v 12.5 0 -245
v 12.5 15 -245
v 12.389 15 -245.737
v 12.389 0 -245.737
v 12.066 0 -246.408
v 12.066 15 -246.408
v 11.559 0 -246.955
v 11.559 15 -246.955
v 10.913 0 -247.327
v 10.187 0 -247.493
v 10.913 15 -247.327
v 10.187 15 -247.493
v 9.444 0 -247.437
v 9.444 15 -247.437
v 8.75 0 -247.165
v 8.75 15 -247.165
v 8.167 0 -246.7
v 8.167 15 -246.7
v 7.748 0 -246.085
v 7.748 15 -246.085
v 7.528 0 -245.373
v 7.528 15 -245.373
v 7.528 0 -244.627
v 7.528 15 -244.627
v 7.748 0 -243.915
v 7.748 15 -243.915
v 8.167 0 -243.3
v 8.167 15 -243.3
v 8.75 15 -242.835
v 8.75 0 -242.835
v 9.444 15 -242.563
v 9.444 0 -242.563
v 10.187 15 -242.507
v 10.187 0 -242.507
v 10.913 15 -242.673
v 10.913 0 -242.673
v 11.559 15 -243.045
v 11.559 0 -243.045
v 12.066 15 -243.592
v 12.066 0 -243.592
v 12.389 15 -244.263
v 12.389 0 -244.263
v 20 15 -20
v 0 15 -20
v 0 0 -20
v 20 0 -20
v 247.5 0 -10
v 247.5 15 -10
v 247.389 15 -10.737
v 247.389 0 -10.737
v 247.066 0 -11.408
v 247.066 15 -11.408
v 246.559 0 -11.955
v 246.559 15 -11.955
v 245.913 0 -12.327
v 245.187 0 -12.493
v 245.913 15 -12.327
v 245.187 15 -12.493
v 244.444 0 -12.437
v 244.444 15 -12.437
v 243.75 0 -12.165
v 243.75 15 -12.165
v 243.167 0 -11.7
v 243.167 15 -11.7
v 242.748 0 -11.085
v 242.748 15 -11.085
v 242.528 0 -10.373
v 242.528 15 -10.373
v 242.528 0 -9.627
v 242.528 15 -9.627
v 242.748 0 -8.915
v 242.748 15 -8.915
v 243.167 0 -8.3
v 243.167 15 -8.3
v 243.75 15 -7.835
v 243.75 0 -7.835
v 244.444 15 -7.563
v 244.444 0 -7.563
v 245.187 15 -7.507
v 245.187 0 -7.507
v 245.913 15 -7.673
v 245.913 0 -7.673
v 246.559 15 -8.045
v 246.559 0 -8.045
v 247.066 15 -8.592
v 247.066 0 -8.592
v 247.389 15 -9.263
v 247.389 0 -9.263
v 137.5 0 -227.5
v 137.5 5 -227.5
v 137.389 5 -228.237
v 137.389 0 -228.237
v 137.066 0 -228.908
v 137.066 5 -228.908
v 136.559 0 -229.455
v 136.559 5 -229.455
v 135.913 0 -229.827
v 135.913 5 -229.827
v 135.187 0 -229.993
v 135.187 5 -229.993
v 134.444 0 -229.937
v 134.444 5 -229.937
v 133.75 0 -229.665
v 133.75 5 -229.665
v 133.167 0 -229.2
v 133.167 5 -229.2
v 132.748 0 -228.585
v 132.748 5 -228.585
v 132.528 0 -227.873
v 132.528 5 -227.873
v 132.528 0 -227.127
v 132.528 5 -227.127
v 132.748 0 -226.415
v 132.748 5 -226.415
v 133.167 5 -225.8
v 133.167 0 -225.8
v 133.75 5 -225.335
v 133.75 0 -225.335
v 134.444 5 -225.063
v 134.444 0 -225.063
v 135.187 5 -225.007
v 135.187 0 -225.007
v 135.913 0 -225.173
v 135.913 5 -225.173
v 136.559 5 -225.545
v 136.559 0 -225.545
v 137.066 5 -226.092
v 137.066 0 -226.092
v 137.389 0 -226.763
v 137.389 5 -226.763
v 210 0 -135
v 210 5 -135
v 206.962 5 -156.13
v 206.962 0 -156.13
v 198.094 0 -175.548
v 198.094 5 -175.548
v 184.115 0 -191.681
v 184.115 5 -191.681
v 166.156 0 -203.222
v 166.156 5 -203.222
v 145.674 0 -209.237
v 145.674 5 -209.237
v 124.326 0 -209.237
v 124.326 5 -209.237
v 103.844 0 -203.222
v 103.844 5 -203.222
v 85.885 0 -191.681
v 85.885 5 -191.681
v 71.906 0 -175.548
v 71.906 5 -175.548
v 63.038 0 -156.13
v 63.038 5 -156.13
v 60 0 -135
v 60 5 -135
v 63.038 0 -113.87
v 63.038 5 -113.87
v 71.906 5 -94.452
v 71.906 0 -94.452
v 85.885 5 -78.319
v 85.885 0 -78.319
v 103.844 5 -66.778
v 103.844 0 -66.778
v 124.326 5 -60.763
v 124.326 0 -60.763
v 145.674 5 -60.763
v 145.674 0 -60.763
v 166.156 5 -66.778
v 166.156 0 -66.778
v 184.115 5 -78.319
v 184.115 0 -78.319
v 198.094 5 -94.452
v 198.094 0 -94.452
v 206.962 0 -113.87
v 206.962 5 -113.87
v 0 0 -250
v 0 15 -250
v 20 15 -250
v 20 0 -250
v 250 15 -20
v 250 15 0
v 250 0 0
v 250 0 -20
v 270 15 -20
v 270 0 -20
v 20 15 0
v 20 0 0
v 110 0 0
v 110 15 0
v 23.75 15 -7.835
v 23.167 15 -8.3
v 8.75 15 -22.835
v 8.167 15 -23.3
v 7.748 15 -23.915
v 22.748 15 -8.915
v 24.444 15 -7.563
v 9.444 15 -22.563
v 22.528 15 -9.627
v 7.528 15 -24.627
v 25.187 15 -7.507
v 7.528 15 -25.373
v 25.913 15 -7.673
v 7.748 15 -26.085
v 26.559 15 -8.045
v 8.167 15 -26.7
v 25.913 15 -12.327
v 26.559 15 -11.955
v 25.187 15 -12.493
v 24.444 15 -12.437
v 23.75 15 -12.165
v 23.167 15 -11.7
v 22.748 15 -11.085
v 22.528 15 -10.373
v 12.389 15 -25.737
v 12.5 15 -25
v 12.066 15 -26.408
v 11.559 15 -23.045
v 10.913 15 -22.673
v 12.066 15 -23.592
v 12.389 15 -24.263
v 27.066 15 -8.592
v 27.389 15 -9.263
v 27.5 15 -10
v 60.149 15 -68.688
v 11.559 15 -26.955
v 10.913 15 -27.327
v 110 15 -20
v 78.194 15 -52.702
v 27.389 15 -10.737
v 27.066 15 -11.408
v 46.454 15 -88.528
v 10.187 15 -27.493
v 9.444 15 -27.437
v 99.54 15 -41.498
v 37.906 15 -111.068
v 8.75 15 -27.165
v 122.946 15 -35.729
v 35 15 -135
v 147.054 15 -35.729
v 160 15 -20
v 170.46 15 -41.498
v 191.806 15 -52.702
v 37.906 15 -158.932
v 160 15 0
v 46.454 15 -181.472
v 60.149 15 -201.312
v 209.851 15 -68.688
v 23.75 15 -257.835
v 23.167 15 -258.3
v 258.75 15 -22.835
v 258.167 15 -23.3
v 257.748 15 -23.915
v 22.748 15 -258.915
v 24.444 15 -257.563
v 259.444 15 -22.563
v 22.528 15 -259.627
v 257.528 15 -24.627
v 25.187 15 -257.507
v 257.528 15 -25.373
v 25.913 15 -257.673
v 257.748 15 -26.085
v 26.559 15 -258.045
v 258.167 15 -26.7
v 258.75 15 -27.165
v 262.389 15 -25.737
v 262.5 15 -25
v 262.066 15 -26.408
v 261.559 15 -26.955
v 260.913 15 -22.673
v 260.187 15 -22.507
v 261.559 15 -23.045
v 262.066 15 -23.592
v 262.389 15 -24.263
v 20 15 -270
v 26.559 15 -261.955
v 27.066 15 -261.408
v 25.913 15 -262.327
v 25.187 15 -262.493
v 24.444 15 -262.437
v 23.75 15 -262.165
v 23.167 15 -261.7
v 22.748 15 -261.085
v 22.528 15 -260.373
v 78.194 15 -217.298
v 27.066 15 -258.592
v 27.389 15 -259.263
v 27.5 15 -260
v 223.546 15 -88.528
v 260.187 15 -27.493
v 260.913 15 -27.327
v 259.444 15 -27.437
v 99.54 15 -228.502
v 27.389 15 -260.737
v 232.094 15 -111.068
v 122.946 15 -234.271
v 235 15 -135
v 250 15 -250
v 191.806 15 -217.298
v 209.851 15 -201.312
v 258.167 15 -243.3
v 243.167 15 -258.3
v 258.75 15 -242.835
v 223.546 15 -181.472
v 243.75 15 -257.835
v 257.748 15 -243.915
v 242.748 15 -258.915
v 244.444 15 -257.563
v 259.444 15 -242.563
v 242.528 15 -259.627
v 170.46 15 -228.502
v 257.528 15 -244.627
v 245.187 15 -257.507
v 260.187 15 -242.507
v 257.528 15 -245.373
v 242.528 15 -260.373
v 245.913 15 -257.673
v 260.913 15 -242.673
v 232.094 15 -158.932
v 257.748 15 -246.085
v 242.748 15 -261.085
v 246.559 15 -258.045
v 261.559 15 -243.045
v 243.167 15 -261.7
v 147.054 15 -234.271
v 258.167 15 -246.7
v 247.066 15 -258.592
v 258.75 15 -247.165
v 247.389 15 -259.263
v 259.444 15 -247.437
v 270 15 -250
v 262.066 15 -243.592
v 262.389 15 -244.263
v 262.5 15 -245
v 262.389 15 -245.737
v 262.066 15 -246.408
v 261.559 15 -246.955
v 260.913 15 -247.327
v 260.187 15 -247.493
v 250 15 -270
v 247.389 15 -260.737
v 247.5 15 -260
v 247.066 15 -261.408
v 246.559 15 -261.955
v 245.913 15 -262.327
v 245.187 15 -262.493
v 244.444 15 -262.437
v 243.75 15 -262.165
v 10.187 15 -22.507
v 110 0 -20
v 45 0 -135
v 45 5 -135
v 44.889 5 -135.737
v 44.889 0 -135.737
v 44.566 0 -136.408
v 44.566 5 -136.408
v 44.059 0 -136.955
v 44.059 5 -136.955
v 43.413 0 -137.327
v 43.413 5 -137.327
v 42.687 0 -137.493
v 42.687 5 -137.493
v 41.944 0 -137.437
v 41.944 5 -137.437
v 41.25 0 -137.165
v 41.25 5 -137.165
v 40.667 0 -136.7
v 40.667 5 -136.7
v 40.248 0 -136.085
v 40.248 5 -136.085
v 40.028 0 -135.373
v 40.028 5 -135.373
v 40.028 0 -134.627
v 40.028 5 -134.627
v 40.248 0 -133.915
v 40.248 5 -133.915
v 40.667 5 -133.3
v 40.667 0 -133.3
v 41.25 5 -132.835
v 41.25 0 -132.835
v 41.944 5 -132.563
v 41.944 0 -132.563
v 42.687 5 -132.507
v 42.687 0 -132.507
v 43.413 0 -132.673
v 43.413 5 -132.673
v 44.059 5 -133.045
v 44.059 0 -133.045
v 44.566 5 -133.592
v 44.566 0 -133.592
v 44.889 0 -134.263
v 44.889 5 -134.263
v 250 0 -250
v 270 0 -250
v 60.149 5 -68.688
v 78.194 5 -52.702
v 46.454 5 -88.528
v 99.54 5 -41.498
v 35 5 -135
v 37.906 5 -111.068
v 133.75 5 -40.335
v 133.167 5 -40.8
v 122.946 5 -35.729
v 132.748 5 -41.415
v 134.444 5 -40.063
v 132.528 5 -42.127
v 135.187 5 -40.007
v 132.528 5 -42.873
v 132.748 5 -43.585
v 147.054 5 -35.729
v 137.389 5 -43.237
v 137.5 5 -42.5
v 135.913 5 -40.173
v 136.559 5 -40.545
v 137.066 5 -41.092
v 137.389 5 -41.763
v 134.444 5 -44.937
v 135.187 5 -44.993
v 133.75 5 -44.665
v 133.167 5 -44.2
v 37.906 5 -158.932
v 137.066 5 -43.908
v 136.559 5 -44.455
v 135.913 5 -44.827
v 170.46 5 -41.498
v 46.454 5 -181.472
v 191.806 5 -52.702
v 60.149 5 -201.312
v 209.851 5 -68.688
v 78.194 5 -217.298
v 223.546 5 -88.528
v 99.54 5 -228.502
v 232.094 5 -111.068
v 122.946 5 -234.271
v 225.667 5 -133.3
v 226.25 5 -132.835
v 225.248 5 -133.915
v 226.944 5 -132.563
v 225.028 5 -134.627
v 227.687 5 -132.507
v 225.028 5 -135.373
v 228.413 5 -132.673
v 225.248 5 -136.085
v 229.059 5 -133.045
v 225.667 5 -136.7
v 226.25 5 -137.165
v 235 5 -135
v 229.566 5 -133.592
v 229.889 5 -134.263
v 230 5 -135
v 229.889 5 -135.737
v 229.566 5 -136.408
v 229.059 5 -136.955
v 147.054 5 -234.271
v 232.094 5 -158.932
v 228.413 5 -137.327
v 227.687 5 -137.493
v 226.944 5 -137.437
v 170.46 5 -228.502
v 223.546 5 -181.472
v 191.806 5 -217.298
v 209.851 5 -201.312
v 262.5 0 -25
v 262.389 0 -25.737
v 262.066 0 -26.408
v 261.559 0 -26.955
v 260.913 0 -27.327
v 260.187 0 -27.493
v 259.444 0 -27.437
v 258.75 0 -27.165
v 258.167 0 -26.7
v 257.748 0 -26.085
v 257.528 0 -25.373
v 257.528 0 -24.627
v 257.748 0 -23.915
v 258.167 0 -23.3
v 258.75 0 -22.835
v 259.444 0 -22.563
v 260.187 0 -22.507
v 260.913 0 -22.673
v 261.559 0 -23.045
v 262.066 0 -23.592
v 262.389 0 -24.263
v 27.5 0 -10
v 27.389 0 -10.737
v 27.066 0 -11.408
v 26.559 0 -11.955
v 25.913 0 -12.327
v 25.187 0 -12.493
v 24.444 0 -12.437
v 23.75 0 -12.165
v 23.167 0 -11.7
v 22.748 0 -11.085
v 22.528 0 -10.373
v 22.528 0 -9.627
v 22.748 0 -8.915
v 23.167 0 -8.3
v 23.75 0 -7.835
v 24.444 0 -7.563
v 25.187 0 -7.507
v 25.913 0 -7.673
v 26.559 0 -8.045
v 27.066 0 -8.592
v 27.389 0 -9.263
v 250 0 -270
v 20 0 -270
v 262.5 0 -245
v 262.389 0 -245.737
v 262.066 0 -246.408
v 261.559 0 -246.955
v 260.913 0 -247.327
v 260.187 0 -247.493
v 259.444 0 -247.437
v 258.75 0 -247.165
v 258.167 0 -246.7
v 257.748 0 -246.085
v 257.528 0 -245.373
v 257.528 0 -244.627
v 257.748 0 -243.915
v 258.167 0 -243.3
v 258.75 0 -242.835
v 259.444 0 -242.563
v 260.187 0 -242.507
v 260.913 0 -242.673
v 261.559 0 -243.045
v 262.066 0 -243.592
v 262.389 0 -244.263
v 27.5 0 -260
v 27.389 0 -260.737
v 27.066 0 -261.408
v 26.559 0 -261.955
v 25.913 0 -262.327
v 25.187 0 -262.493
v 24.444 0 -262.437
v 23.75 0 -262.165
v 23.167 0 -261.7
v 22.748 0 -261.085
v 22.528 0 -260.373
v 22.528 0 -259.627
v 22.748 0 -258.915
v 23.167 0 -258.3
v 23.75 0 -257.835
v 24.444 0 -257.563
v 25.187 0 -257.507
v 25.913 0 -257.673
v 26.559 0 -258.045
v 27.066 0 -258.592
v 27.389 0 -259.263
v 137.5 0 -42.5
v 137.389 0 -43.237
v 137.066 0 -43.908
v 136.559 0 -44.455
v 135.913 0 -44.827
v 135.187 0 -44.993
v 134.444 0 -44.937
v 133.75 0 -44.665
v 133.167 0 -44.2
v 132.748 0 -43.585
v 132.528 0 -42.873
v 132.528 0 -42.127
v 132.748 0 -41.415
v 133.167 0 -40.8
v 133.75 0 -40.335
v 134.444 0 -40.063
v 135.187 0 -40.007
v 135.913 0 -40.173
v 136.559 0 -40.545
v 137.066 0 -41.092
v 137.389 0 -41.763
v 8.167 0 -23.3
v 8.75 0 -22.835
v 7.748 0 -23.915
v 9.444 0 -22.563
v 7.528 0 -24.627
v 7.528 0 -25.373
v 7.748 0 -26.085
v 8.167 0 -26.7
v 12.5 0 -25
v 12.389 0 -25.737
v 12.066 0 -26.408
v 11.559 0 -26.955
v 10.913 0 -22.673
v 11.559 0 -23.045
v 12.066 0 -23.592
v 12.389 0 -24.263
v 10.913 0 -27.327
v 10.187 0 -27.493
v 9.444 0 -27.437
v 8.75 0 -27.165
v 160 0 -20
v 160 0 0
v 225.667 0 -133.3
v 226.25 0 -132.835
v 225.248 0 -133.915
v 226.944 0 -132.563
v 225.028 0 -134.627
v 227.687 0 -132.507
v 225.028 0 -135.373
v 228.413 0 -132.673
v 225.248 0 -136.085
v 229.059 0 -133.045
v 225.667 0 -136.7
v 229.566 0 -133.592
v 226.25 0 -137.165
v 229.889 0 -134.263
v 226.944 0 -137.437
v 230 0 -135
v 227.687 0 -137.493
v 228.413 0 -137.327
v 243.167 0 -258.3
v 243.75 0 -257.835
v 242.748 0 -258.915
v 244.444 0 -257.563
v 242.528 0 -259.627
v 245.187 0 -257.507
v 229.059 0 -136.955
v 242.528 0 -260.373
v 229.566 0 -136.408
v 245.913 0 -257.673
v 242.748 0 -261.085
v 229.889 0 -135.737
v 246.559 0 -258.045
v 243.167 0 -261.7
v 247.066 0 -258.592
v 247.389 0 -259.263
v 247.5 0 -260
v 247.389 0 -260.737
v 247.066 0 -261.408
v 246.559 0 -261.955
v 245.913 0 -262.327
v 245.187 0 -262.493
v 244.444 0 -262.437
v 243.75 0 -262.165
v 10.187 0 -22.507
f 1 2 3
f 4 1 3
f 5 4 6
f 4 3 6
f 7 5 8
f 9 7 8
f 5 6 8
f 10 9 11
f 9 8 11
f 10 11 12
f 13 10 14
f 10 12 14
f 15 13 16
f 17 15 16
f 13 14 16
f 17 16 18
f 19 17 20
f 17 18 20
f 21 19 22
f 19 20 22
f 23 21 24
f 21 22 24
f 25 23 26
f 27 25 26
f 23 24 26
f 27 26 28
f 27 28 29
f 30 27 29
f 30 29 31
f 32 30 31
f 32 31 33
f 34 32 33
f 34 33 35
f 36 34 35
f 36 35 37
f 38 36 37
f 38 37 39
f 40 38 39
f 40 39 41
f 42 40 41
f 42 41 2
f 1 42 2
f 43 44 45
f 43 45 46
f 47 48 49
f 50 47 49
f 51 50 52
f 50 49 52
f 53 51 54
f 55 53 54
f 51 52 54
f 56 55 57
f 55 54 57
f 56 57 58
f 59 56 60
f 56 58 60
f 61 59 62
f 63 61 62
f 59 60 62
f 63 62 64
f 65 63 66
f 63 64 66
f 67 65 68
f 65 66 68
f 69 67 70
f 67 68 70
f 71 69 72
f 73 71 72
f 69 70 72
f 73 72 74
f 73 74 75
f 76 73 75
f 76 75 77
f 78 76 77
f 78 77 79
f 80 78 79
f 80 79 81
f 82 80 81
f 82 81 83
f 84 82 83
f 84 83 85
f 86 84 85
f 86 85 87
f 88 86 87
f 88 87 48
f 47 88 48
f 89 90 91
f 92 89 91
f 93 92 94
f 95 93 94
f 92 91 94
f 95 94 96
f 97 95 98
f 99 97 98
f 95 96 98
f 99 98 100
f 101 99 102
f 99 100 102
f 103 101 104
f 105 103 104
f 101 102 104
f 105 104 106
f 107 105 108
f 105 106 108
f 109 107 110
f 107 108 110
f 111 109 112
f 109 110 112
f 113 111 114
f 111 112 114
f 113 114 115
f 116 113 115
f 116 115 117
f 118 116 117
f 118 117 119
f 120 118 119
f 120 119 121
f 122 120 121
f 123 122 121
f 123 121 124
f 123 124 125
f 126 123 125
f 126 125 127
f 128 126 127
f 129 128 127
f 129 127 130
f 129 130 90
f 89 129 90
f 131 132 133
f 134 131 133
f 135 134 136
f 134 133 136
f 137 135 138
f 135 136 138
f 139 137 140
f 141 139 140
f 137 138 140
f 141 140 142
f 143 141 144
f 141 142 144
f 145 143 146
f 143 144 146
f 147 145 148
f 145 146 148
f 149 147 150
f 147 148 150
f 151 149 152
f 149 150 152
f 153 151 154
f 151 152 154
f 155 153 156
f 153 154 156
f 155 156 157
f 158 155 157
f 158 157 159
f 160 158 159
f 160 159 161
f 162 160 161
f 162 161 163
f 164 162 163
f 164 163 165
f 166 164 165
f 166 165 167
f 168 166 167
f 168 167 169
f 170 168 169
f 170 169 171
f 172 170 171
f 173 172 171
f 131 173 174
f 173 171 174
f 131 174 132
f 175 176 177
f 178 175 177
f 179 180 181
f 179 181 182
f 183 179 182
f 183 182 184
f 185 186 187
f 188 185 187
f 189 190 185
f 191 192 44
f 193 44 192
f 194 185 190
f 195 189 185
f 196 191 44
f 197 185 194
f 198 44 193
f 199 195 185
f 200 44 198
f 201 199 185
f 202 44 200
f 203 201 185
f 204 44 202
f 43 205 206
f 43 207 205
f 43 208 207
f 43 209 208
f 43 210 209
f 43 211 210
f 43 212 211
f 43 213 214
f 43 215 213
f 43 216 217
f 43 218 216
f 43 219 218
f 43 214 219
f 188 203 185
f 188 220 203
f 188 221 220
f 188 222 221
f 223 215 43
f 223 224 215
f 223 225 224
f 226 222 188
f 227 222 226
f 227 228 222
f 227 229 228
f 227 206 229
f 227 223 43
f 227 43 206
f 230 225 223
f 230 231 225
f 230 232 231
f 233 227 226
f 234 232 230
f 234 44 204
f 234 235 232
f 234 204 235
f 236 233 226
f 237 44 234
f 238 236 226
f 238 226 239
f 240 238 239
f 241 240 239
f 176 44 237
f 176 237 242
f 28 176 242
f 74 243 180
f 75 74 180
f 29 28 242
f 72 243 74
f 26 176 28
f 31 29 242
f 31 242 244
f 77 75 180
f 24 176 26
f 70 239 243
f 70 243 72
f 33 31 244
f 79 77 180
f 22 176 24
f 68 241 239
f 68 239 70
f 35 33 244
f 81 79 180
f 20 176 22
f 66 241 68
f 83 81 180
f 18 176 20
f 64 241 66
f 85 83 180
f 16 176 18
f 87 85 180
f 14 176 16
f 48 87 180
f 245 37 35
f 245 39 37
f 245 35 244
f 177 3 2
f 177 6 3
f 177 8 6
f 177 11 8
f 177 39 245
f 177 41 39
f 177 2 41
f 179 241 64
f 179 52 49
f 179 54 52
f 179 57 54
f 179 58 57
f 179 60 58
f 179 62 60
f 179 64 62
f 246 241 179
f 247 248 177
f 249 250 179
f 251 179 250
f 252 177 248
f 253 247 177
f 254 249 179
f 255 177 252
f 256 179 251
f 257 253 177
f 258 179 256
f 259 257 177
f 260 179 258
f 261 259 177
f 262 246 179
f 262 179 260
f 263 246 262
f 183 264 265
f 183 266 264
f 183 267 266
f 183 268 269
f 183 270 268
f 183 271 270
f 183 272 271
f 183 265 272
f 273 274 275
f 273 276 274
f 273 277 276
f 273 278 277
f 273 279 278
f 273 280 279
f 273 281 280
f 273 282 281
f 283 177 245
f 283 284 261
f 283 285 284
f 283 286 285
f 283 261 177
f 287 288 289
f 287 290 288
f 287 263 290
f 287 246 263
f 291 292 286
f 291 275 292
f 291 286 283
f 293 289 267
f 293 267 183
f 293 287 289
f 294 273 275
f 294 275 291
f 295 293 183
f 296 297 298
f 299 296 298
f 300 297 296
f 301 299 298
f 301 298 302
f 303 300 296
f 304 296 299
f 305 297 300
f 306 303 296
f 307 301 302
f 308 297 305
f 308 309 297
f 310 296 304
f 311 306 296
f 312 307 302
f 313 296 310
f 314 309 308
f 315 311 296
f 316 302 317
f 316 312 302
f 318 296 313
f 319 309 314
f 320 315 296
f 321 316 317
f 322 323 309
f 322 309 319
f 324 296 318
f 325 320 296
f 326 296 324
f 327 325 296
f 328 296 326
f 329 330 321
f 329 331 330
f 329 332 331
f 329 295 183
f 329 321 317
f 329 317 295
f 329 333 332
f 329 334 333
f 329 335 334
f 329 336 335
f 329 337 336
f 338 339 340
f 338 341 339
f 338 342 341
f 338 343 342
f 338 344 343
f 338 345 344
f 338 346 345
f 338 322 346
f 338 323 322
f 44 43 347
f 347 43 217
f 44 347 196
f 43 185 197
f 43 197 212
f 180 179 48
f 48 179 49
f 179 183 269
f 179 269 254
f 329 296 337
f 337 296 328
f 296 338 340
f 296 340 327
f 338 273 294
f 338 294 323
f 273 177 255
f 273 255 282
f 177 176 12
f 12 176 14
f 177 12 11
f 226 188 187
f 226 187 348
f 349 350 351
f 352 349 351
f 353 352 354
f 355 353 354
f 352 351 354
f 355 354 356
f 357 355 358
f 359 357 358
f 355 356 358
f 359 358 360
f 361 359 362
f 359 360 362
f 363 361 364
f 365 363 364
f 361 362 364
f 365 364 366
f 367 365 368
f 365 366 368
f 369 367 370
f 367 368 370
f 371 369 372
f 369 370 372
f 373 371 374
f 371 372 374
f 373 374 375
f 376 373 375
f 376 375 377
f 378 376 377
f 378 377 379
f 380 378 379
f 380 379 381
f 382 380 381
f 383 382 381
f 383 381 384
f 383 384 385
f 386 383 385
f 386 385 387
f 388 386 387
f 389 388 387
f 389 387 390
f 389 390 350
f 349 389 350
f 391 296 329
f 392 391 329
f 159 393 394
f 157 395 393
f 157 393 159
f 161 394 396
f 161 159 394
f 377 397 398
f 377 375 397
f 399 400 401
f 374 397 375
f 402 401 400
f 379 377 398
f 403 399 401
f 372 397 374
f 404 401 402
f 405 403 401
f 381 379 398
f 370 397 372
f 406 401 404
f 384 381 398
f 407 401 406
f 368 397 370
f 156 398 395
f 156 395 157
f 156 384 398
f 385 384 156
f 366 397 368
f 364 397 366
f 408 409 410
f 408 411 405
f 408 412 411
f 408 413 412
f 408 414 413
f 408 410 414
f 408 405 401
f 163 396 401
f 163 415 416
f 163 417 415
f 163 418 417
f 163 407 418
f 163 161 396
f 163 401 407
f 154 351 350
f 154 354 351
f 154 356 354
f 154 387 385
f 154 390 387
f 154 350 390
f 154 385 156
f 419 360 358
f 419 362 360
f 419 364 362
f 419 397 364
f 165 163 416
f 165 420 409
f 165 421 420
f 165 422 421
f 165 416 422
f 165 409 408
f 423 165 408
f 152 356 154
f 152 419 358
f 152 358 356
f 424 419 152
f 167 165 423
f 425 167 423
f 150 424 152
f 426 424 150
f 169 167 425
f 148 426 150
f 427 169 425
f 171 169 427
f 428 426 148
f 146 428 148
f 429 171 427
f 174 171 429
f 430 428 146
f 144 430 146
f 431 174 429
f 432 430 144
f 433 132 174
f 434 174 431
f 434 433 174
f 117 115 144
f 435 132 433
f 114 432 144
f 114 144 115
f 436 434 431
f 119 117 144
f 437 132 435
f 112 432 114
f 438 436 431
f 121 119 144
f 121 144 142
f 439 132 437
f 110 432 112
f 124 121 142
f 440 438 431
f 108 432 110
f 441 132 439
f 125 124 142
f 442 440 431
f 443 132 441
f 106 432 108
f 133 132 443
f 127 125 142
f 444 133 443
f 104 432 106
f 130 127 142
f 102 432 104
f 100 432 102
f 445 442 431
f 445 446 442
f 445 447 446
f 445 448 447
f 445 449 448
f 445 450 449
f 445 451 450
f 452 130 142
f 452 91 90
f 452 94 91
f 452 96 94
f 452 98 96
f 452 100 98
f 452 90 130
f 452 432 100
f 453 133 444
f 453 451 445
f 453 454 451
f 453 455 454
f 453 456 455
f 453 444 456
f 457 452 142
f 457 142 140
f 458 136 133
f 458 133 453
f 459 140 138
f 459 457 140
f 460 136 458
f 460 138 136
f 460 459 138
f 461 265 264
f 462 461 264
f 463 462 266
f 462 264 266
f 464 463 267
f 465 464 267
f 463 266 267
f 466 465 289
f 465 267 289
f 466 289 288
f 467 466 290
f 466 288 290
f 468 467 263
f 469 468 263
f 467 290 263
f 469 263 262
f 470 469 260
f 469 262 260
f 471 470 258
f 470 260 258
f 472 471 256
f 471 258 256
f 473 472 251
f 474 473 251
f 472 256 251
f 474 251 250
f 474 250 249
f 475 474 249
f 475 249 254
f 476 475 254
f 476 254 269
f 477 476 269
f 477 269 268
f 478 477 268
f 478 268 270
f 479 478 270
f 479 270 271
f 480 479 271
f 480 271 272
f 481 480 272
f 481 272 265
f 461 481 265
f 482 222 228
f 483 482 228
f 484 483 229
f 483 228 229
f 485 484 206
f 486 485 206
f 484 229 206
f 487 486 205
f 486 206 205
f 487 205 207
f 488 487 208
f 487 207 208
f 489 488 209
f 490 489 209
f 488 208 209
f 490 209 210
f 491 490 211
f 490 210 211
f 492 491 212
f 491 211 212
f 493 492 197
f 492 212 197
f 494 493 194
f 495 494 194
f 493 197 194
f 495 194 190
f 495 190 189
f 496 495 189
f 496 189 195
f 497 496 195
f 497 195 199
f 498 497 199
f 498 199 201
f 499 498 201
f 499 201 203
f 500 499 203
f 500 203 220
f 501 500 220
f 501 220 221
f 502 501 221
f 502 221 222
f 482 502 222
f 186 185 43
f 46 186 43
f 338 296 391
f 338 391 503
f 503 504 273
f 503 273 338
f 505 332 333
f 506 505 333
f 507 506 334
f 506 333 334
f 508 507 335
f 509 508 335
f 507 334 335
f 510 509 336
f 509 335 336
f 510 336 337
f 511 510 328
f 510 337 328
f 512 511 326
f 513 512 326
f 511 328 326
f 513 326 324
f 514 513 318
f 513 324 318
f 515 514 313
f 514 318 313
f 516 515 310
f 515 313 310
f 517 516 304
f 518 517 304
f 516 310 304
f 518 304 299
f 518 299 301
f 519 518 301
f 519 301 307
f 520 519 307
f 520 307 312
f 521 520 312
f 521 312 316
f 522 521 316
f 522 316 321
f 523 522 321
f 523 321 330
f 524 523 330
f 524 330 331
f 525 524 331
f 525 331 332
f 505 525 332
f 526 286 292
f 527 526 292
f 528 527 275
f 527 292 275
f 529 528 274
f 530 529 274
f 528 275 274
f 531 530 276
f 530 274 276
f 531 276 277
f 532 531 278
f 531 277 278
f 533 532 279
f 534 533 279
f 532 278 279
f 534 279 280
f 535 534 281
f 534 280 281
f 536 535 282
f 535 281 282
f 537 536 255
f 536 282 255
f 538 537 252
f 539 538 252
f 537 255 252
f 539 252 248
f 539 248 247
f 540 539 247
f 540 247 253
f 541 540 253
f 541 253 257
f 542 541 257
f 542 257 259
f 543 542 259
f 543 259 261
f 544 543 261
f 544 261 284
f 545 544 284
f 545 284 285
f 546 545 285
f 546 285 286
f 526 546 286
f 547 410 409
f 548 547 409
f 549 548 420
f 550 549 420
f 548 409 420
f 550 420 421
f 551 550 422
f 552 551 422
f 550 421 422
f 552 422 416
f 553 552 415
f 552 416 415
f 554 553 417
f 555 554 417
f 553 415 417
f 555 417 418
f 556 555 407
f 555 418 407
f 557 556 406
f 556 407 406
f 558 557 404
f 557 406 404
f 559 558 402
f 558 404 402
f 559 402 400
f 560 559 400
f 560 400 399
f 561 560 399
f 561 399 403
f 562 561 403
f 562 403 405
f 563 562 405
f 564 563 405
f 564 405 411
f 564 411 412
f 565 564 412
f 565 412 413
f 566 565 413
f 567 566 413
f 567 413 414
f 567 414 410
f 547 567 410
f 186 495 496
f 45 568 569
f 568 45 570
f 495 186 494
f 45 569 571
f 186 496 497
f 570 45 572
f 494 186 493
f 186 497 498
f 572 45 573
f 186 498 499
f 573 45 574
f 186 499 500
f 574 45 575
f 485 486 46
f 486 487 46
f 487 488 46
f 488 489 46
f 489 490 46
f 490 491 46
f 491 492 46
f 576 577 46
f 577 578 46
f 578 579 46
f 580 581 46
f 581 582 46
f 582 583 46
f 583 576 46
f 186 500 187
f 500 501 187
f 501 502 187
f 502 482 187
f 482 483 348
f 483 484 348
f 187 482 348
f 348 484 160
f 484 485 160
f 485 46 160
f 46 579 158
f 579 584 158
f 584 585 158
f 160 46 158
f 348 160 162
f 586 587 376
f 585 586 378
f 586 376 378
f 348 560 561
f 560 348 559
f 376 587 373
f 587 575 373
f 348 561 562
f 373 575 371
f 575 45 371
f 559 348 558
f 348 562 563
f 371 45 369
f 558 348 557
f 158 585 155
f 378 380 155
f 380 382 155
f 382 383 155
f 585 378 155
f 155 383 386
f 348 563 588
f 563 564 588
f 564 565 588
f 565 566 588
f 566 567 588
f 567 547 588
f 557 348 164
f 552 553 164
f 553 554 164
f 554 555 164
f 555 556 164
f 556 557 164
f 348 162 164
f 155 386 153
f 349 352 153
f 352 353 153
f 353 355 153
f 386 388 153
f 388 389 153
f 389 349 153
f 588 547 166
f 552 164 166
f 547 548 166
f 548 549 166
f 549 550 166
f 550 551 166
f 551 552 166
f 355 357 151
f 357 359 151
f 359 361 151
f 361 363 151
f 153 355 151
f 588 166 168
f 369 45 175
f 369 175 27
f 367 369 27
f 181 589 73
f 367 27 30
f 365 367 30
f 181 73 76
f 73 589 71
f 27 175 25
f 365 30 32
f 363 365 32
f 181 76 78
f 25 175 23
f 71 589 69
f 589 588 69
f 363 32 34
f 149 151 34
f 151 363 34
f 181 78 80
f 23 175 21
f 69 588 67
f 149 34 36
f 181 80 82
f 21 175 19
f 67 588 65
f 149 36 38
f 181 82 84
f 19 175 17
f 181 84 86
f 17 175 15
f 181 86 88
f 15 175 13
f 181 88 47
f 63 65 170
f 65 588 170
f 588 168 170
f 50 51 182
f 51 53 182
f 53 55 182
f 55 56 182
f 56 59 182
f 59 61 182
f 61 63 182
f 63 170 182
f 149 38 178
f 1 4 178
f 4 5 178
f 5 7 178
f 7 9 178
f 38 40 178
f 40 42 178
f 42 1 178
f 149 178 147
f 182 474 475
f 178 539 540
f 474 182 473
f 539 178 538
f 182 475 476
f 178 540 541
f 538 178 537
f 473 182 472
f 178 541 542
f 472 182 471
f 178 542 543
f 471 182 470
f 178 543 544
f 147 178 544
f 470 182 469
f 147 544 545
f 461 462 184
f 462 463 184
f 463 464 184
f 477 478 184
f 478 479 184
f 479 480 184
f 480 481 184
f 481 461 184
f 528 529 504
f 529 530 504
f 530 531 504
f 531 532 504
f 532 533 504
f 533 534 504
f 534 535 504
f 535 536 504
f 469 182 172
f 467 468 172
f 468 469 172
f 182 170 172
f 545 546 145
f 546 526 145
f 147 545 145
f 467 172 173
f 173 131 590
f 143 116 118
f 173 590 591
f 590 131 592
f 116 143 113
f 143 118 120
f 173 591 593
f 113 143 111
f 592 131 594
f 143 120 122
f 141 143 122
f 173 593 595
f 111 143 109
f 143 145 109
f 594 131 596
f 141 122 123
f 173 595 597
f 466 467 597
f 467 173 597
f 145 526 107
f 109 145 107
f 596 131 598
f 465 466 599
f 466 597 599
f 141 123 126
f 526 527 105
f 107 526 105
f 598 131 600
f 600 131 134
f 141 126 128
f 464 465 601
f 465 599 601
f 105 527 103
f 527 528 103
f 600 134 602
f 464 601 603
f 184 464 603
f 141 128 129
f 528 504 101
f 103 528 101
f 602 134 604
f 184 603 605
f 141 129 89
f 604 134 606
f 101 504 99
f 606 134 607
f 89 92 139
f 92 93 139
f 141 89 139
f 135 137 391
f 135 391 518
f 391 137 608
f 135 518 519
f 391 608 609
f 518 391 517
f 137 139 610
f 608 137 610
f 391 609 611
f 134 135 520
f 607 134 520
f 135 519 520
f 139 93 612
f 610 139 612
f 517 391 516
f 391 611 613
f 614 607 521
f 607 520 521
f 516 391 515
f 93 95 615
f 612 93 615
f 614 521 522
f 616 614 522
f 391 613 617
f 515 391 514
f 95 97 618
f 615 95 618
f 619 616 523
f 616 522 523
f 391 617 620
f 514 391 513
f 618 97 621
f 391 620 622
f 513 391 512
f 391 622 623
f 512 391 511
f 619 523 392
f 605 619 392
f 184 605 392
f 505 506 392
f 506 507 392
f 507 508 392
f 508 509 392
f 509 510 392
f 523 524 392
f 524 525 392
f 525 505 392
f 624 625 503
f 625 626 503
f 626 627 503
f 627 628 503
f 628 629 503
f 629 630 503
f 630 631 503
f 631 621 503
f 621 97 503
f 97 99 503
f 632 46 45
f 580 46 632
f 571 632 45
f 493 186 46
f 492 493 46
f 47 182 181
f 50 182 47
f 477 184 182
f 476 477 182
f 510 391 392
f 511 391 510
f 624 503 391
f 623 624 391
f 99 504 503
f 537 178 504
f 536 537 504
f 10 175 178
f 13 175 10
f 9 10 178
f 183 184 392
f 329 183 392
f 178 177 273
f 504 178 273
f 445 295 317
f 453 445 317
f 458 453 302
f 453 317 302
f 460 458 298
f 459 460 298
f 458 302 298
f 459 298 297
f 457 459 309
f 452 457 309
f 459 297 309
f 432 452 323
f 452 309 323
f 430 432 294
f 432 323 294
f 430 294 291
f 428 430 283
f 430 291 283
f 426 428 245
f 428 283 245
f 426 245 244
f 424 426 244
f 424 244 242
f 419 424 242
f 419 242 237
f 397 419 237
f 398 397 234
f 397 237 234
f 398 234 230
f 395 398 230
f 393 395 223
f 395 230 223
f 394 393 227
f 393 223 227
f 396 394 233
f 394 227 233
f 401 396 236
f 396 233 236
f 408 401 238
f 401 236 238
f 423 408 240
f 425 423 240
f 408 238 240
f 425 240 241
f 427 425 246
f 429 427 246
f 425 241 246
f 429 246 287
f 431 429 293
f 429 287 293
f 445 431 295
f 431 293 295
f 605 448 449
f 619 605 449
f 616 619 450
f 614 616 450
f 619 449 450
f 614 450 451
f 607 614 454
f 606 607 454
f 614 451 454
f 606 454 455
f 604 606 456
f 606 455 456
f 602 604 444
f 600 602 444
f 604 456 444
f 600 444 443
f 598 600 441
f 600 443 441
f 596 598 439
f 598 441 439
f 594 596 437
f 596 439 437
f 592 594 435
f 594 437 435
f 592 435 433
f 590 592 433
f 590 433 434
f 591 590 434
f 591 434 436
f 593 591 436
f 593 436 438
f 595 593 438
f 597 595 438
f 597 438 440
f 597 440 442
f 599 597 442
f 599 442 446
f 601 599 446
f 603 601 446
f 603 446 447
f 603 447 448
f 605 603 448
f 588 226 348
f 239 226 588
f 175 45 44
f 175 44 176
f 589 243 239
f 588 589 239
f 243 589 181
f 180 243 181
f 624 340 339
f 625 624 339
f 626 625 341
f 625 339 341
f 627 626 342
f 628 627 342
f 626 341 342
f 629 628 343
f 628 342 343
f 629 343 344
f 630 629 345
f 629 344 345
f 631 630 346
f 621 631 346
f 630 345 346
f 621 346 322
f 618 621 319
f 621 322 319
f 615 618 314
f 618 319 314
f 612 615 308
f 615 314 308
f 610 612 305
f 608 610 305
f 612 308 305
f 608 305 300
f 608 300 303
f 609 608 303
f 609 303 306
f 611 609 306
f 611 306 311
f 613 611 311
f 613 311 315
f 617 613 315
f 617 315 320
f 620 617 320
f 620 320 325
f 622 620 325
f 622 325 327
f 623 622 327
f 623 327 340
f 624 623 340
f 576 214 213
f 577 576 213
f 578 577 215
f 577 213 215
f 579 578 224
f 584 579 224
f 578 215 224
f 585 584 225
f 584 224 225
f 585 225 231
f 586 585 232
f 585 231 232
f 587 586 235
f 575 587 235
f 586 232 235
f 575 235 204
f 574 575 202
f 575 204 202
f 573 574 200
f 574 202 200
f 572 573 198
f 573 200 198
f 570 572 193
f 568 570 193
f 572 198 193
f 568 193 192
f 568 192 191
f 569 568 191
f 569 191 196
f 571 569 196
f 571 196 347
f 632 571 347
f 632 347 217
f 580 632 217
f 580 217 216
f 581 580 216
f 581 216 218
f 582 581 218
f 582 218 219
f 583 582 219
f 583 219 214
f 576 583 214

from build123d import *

# Parameters (mm, degrees)
SKETCH1_W           = 270
SKETCH1_H           = 270
BOSS_EXTRUDE1_DEPTH = 15
SKETCH8_W           = 20
SKETCH8_H           = 20
CUT_EXTRUDE1_DEPTH  = 16
SKETCH9_R           = 2.5
CUT_EXTRUDE2_DEPTH  = 16
SKETCH10_R          = 100
CUT_EXTRUDE3_DEPTH  = 10
SKETCH12_R          = 75
SKETCH12_R_2        = 2.5
CUT_EXTRUDE4_DEPTH  = 6
SKETCH13_W          = 50
SKETCH13_H          = 20
CUT_EXTRUDE5_DEPTH  = 15


with BuildPart() as part:
    # Sketch1 → Boss-Extrude1 (new body)
    with BuildSketch(Plane(origin=(0, 0, 0), x_dir=(1, 0, 0), z_dir=(0, 1, 0))):
        with Locations((135, 135)):
            Rectangle(SKETCH1_W, SKETCH1_H)
    extrude(amount=BOSS_EXTRUDE1_DEPTH)

    # Sketch8 → Cut-Extrude1 (cut, through all)
    with BuildSketch(Plane(origin=(0, 15, 0), x_dir=(1, 0, 0), z_dir=(0, 1, 0))):
        with Locations((10, 260)):
            Rectangle(SKETCH8_W, SKETCH8_H)
        with Locations((260, 260)):
            Rectangle(SKETCH8_W, SKETCH8_H)
        with Locations((260, 10)):
            Rectangle(SKETCH8_W, SKETCH8_H)
        with Locations((10, 10)):
            Rectangle(SKETCH8_W, SKETCH8_H)
    extrude(amount=-CUT_EXTRUDE1_DEPTH, mode=Mode.SUBTRACT)

    # Sketch9 → Cut-Extrude2 (cut, through all)
    with BuildSketch(Plane(origin=(0, 15, 0), x_dir=(1, 0, 0), z_dir=(0, 1, 0))):
        with Locations((10, 245)):
            Circle(SKETCH9_R)
        with Locations((10, 25)):
            Circle(SKETCH9_R)
        with Locations((25, 10)):
            Circle(SKETCH9_R)
        with Locations((245, 10)):
            Circle(SKETCH9_R)
        with Locations((260, 25)):
            Circle(SKETCH9_R)
        with Locations((260, 245)):
            Circle(SKETCH9_R)
        with Locations((245, 260)):
            Circle(SKETCH9_R)
        with Locations((25, 260)):
            Circle(SKETCH9_R)
    extrude(amount=-CUT_EXTRUDE2_DEPTH, mode=Mode.SUBTRACT)

    # Sketch10 → Cut-Extrude3 (cut)
    with BuildSketch(Plane(origin=(0, 15, 0), x_dir=(1, 0, 0), z_dir=(0, 1, 0))):
        with Locations((135, 135)):
            Circle(SKETCH10_R)
    extrude(amount=-CUT_EXTRUDE3_DEPTH, mode=Mode.SUBTRACT)

    # Sketch12 → Cut-Extrude4 (cut, through all)
    with BuildSketch(Plane(origin=(0, 5, 0), x_dir=(1, 0, 0), z_dir=(0, 1, 0))):
        with Locations((135, 135)):
            Circle(SKETCH12_R)
        with Locations((135, 227.5)):
            Circle(SKETCH12_R_2)
        with Locations((227.5, 135)):
            Circle(SKETCH12_R_2)
        with Locations((135, 42.5)):
            Circle(SKETCH12_R_2)
        with Locations((42.5, 135)):
            Circle(SKETCH12_R_2)
    extrude(amount=-CUT_EXTRUDE4_DEPTH, mode=Mode.SUBTRACT)

    # Sketch13 → Cut-Extrude5 (cut)
    with BuildSketch(Plane(origin=(0, 15, 0), x_dir=(1, 0, 0), z_dir=(0, 1, 0))):
        with Locations((135, 10)):
            Rectangle(SKETCH13_W, SKETCH13_H)
    extrude(amount=-CUT_EXTRUDE5_DEPTH, mode=Mode.SUBTRACT)


solid = part.part
